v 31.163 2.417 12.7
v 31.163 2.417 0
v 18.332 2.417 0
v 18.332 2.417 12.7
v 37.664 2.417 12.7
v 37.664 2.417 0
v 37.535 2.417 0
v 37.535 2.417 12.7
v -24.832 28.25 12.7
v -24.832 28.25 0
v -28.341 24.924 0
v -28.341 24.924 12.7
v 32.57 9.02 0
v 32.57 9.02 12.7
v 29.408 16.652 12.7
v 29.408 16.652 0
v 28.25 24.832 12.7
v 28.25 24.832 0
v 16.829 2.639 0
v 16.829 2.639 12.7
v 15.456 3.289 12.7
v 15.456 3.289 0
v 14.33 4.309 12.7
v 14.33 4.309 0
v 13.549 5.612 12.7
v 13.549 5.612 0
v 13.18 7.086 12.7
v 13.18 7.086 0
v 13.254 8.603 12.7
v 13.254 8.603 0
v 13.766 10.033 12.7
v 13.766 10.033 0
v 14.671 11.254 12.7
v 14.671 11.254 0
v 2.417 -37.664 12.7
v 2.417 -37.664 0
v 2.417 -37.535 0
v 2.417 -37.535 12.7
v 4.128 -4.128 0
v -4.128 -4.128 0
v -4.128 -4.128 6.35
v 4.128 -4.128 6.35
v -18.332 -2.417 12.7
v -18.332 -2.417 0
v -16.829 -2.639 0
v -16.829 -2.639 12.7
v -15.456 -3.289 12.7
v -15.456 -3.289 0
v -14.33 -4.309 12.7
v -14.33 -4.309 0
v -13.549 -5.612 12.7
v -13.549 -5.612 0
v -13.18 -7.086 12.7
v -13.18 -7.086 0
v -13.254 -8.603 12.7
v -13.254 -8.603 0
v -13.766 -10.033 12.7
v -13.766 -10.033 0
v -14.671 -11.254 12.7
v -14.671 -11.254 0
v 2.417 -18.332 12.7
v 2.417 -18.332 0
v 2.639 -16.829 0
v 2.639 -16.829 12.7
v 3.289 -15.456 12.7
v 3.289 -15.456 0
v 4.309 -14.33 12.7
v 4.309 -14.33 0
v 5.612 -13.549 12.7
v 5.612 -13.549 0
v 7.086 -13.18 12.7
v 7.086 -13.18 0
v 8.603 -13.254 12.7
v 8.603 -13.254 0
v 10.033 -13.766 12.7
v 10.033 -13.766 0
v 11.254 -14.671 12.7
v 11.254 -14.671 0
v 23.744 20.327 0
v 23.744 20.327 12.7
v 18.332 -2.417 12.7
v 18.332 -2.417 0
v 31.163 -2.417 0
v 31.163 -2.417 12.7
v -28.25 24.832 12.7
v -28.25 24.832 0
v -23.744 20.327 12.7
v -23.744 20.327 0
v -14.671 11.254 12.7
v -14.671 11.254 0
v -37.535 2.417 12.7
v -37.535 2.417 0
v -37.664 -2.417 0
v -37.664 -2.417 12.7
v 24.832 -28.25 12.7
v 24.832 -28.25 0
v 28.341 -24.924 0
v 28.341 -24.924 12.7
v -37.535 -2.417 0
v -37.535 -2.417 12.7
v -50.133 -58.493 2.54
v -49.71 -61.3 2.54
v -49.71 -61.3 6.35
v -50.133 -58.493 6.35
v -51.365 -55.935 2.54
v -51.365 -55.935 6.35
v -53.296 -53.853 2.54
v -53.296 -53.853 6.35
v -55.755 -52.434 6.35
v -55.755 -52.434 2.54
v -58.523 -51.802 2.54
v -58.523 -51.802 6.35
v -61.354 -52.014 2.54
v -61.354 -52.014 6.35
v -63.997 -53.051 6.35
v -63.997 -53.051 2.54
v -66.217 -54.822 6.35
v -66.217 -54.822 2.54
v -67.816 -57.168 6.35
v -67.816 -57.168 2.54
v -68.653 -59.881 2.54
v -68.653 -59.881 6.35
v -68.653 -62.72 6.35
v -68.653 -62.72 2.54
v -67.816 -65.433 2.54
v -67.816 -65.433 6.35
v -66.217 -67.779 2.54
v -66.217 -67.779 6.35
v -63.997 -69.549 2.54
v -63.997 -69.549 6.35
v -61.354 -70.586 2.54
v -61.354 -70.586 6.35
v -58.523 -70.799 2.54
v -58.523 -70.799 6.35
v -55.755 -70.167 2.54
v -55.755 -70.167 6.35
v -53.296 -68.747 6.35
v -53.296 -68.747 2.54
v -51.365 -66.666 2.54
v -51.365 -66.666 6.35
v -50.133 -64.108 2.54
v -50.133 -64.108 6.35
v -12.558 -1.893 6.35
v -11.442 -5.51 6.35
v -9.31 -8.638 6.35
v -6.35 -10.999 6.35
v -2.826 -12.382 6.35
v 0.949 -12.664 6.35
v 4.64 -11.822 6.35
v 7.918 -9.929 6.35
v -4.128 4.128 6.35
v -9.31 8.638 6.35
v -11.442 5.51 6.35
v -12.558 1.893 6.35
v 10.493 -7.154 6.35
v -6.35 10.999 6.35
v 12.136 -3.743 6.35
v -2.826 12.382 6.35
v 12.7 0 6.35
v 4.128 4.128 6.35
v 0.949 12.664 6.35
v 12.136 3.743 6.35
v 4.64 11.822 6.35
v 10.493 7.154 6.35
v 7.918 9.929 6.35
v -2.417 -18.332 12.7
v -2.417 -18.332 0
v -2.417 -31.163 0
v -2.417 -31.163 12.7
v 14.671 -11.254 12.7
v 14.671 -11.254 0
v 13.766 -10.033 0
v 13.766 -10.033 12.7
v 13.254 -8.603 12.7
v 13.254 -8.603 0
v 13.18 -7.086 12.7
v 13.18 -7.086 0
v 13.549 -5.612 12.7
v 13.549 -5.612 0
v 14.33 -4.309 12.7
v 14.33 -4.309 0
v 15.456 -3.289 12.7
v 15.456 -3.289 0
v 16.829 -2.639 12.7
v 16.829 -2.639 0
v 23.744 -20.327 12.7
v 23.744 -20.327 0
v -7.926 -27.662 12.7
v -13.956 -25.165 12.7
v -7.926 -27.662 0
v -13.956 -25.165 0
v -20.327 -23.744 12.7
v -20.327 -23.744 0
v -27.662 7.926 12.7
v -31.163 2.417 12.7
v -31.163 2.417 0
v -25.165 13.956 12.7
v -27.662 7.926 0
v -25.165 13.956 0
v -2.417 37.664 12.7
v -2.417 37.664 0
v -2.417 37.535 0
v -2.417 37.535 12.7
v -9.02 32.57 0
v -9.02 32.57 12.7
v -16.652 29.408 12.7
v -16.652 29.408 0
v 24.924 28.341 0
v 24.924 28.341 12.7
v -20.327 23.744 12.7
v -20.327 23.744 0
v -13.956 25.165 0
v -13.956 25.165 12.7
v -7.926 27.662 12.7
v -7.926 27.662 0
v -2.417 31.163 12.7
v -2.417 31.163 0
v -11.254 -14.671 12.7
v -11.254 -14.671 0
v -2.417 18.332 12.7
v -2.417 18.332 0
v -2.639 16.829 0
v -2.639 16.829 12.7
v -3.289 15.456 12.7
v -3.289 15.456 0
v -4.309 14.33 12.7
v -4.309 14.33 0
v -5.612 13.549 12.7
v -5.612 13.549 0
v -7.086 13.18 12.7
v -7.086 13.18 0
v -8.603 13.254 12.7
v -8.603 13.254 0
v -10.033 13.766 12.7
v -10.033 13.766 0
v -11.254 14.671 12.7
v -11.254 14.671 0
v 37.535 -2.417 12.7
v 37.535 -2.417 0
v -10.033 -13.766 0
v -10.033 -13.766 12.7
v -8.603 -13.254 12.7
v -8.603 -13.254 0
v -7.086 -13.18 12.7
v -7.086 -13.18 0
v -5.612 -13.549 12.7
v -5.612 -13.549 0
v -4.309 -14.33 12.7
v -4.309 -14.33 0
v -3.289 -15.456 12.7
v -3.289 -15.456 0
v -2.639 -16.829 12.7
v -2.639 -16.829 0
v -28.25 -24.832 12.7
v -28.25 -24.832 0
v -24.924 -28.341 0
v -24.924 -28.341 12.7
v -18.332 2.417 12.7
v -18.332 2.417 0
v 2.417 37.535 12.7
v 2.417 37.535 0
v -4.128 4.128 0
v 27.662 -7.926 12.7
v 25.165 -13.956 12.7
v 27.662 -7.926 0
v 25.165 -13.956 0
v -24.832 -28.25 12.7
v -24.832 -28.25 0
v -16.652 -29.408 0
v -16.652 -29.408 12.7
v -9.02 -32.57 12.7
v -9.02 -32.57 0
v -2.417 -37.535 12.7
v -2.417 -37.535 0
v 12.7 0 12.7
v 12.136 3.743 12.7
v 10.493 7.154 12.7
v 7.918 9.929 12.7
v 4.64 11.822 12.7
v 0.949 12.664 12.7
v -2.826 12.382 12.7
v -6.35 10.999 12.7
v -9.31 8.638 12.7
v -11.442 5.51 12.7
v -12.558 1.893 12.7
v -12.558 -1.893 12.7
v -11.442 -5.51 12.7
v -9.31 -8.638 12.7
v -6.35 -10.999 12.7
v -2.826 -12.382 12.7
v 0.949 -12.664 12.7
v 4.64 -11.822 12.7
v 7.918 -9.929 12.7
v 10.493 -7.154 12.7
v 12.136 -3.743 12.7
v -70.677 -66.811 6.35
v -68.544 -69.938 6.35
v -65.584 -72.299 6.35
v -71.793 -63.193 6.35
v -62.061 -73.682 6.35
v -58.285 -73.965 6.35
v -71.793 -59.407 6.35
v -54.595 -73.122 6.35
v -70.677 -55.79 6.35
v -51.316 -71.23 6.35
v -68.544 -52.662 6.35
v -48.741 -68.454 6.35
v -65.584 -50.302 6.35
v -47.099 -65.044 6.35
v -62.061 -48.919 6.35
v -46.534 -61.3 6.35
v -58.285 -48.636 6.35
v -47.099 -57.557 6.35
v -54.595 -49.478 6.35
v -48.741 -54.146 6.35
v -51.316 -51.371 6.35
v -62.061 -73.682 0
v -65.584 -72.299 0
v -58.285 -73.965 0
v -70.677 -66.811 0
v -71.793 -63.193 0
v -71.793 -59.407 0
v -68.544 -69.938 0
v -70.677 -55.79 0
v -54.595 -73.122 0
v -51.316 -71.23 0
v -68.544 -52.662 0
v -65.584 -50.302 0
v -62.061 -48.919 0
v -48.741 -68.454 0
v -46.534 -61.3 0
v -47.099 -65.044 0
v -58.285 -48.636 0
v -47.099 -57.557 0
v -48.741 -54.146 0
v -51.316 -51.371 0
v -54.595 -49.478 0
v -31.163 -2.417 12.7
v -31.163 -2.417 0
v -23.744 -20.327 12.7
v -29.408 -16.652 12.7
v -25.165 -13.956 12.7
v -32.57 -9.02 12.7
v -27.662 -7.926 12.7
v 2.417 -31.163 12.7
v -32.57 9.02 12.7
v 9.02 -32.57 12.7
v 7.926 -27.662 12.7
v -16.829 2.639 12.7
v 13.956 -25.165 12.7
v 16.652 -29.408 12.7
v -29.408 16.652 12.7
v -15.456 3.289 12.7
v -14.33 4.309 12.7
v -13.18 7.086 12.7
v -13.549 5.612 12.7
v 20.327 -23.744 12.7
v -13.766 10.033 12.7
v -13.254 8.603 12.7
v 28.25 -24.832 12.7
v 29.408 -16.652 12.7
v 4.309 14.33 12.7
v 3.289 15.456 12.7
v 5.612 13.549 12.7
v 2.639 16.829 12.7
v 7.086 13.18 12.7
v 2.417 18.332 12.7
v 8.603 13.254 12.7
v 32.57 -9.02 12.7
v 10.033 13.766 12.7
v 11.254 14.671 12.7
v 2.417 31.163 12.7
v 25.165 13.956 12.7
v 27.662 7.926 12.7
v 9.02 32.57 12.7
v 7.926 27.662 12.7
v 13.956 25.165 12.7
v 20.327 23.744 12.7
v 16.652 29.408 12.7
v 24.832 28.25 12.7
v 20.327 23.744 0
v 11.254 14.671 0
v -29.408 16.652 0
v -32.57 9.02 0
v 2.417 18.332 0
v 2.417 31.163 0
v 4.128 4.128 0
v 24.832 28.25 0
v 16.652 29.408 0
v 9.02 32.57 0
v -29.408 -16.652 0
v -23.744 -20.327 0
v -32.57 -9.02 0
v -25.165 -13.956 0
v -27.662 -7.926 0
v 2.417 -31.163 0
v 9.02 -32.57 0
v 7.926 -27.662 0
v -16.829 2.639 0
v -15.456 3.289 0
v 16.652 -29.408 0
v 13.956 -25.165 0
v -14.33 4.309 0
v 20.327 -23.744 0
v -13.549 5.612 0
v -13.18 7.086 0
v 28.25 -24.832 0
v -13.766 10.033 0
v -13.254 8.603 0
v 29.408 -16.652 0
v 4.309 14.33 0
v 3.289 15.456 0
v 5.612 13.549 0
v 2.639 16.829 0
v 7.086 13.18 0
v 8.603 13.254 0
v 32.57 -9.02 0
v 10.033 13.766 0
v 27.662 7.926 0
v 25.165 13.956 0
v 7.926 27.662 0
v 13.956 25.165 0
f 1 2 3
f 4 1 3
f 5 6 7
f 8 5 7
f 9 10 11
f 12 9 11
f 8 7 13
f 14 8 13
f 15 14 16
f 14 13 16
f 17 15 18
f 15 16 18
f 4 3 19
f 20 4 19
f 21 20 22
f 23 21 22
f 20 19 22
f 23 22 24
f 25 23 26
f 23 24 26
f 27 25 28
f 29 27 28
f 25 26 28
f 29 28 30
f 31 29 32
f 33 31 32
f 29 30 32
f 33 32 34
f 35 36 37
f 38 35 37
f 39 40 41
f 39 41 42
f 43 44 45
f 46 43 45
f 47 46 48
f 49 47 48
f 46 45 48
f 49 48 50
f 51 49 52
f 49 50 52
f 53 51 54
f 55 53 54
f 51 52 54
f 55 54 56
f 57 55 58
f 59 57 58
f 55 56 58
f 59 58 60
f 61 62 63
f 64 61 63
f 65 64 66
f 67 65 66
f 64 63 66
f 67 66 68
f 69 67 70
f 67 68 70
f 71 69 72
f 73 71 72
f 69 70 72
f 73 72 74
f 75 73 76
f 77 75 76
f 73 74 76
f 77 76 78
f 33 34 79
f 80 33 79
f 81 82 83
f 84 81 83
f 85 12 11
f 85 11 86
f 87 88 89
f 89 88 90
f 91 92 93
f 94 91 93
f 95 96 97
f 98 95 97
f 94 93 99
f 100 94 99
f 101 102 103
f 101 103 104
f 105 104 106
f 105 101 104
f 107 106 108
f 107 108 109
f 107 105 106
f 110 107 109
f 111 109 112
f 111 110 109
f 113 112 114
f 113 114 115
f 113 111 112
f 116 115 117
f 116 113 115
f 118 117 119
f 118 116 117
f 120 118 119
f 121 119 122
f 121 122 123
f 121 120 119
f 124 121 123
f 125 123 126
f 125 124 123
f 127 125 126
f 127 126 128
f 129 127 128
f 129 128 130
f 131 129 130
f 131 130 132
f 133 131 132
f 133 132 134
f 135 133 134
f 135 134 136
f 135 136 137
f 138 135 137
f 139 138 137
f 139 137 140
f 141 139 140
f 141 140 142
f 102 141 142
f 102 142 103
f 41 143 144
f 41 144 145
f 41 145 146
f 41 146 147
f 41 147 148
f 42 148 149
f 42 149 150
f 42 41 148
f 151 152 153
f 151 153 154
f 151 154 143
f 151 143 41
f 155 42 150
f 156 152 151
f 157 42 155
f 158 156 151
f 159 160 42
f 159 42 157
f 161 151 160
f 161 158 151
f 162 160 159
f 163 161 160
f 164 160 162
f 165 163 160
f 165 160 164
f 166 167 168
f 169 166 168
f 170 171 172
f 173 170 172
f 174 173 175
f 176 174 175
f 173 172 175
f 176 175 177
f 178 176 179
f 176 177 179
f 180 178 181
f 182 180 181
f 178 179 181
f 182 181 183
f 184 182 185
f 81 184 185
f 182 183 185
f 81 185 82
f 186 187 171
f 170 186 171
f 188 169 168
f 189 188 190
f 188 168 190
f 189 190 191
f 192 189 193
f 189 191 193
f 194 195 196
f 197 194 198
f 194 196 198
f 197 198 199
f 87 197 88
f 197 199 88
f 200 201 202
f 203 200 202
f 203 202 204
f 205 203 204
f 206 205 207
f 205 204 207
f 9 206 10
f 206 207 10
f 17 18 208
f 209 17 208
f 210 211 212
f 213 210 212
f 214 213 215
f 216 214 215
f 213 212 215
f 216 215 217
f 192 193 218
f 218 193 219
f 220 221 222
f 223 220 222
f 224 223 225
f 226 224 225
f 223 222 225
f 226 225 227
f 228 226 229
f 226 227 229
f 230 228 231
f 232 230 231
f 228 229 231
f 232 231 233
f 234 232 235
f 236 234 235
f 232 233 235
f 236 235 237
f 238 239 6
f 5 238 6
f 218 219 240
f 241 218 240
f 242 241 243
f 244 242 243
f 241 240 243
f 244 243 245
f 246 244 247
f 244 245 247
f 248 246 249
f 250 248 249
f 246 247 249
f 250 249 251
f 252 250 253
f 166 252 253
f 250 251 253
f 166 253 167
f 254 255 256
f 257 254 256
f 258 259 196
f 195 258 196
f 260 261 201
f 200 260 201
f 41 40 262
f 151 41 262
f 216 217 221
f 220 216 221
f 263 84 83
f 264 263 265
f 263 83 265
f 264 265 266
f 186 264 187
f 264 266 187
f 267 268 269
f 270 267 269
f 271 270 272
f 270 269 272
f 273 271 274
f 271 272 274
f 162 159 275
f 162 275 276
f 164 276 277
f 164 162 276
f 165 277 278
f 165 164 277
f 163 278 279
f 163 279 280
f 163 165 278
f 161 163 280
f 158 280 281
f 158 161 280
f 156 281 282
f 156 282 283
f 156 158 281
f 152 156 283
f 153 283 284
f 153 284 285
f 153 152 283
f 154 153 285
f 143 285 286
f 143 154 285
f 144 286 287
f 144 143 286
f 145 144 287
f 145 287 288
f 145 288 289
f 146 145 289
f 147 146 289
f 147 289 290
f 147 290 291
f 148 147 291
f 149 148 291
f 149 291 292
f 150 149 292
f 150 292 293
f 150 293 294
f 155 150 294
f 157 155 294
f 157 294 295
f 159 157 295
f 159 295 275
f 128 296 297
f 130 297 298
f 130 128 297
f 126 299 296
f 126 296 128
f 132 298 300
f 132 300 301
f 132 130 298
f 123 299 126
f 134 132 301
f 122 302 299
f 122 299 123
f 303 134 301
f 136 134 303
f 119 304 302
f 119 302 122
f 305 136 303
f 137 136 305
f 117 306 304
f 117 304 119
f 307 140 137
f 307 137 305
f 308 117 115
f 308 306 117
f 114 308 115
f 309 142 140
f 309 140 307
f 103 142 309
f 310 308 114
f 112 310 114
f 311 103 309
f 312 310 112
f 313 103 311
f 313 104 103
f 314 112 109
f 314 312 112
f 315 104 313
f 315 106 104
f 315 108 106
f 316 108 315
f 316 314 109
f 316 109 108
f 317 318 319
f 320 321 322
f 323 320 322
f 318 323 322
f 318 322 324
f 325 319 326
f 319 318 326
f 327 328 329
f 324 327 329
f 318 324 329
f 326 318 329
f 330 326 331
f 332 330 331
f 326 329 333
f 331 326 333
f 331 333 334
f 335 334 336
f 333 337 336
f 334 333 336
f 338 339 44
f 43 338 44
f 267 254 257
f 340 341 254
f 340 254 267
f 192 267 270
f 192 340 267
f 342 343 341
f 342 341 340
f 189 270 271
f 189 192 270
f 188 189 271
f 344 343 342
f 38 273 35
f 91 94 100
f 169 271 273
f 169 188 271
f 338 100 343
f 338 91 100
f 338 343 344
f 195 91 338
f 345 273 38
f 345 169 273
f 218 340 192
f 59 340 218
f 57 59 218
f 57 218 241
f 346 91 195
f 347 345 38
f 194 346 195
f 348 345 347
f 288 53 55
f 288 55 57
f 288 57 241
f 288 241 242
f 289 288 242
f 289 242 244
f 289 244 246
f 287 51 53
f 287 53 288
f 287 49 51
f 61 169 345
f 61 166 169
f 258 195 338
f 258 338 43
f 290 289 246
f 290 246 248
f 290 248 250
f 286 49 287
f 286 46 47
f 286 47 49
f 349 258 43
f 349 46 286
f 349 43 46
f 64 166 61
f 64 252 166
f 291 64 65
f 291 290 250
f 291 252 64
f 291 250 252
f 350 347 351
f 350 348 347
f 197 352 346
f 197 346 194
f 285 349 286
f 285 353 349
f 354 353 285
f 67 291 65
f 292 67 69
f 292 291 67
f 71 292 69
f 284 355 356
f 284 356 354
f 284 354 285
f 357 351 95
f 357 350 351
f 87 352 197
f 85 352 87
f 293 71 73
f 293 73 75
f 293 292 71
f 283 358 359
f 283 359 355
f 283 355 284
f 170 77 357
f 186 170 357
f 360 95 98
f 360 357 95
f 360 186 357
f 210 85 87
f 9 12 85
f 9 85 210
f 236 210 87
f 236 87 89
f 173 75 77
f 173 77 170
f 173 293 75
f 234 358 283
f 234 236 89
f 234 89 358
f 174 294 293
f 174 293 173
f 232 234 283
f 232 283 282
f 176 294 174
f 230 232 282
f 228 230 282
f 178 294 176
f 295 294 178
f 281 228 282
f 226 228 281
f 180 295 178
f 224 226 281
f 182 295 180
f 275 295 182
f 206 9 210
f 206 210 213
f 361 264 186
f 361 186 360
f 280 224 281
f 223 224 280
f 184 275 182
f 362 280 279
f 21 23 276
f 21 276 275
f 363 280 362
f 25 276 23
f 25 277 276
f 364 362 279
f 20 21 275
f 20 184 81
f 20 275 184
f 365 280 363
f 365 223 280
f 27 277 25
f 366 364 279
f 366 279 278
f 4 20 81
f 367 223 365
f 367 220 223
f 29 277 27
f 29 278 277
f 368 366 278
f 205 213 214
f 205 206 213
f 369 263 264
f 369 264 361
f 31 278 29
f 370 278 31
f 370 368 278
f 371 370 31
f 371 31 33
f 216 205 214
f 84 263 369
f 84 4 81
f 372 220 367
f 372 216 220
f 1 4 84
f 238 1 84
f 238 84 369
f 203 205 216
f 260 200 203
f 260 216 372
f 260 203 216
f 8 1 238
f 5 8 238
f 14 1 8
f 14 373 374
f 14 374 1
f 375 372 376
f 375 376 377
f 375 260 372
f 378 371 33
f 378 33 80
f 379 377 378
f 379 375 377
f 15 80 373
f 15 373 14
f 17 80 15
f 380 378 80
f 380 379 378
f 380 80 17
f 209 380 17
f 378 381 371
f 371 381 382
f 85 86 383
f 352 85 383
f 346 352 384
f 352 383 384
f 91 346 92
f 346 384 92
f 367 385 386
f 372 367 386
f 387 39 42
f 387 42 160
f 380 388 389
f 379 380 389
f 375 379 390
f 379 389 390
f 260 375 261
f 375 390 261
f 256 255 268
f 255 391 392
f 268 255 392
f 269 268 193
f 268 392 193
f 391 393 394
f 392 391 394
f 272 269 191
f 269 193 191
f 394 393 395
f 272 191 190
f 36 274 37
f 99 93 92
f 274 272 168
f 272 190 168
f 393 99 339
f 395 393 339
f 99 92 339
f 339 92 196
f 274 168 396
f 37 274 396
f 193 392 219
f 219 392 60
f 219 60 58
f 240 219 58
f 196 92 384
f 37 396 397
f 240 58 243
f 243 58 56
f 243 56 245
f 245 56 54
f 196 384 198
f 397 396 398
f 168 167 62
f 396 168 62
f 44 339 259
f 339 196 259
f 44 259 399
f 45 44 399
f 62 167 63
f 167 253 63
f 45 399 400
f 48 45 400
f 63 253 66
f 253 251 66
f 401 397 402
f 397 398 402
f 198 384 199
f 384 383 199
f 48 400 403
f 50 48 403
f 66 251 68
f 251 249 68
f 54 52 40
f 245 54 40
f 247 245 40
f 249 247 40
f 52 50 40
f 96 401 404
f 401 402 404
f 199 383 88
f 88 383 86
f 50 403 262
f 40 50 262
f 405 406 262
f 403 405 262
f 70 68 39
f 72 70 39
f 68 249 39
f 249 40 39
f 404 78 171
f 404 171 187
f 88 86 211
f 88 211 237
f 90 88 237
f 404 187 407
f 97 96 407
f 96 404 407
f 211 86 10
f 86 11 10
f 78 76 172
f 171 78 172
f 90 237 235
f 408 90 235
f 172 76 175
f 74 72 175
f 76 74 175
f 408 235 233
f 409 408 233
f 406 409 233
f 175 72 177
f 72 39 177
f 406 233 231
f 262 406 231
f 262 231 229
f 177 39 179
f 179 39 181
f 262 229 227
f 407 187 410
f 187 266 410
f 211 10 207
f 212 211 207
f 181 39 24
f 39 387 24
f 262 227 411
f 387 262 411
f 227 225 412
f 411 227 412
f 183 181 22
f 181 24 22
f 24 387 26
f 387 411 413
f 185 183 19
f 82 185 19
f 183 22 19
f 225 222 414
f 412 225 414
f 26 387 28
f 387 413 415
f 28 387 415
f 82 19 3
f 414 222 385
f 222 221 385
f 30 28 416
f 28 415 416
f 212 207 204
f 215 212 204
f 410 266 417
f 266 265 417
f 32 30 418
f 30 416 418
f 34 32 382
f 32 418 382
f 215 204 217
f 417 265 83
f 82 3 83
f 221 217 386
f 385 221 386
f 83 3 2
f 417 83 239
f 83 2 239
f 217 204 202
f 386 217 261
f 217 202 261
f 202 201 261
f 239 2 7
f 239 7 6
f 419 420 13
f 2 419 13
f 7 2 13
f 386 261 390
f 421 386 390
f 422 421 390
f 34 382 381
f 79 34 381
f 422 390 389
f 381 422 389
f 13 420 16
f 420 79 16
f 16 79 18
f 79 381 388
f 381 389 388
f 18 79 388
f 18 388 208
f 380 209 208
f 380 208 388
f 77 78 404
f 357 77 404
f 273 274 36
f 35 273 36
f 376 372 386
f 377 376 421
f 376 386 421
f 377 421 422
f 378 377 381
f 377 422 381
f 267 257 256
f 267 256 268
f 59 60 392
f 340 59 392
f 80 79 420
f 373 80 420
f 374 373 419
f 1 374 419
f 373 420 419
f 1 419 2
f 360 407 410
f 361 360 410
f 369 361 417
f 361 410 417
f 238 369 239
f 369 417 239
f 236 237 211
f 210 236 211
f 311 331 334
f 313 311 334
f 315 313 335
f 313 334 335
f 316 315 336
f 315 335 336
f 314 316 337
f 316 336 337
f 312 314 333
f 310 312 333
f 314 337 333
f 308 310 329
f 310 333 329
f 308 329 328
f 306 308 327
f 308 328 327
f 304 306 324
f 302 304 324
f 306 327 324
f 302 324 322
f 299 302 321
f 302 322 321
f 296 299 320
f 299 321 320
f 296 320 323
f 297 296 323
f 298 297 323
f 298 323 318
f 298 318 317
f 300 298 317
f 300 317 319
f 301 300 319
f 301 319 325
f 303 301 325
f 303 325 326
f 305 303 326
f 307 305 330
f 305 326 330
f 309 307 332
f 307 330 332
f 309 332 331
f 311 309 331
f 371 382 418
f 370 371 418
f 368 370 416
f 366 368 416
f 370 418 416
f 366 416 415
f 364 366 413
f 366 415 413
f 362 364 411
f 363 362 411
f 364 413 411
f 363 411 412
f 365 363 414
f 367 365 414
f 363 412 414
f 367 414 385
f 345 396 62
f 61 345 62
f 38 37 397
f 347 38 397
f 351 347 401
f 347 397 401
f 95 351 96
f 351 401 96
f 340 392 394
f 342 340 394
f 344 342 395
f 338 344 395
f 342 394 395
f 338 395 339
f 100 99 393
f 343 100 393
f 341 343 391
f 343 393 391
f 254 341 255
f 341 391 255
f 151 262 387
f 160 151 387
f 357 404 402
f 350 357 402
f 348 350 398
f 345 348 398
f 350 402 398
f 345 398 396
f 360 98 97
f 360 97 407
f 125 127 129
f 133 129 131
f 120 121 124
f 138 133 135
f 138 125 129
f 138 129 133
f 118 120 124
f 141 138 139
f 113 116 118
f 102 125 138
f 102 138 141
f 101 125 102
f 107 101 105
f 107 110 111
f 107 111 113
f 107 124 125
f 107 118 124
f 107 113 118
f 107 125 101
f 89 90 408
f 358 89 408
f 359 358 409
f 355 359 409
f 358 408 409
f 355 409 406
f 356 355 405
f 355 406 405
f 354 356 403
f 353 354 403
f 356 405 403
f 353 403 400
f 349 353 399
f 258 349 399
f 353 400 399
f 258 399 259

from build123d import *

# Parameters (mm, degrees)
F0_R     = 12.7
F0_W     = 8.255
F0_H     = 8.255
F1_DEPTH = 6.35
F2_DEPTH = 12.7
F3_R     = 12.7
F3_R_2   = 9.525
F4_DEPTH = 6.35
F5_DEPTH = 2.54


with BuildPart() as f1:
    # F0 (on Top) → F1 (new body)
    with BuildSketch(Plane.XY):
        Circle(F0_R)
        Rectangle(F0_W, F0_H, mode=Mode.SUBTRACT)
    extrude(amount=F1_DEPTH)

    # F0 (on Top) → F2 (join)
    with BuildSketch(Plane.XY):
        with BuildLine():
            ThreePointArc((-37.53473, -2.416579), (-30.748057, -12.736262), (-28.249842, -24.832283))
            Line((-28.249842, -24.832283), (-23.744405, -20.326846))
            ThreePointArc((-23.744405, -20.326846), (-26.2828, -10.886692), (-31.163081, -2.416579))
            Line((-31.163081, -2.416579), (-37.53473, -2.416579))
        make_face()
        with BuildLine():
            ThreePointArc((-24.832283, -28.249842), (-12.736262, -30.748057), (-2.416579, -37.53473))
            Line((-2.416579, -37.53473), (-2.416579, -31.163081))
            ThreePointArc((-2.416579, -31.163081), (-10.886692, -26.2828), (-20.326846, -23.744405))
            Line((-20.326846, -23.744405), (-24.832283, -28.249842))
        make_face()
        with BuildLine():
            ThreePointArc((2.416579, -37.53473), (12.736262, -30.748057), (24.832283, -28.249842))
            Line((24.832283, -28.249842), (20.326846, -23.744405))
            ThreePointArc((20.326846, -23.744405), (10.886692, -26.2828), (2.416579, -31.163081))
            Line((2.416579, -31.163081), (2.416579, -37.53473))
        make_face()
        with BuildLine():
            Line((37.53473, -2.416579), (31.163081, -2.416579))
            ThreePointArc((31.163081, -2.416579), (26.2828, -10.886692), (23.744405, -20.326846))
            Line((23.744405, -20.326846), (28.249842, -24.832283))
            ThreePointArc((28.249842, -24.832283), (30.748057, -12.736262), (37.53473, -2.416579))
        make_face()
        with BuildLine():
            Line((31.163081, 2.416579), (37.53473, 2.416579))
            ThreePointArc((37.53473, 2.416579), (30.748057, 12.736262), (28.249842, 24.832283))
            Line((28.249842, 24.832283), (23.744405, 20.326846))
            ThreePointArc((23.744405, 20.326846), (26.2828, 10.886692), (31.163081, 2.416579))
        make_face()
        with BuildLine():
            ThreePointArc((14.671217, -11.253658), (13.549063, -5.612205), (18.331655, -2.416579))
            Line((18.331655, -2.416579), (31.163081, -2.416579))
            Line((31.163081, -2.416579), (37.53473, -2.416579))
            Line((37.53473, -2.416579), (37.66429, 2.416579))
            Line((37.66429, 2.416579), (37.53473, 2.416579))
            Line((37.53473, 2.416579), (31.163081, 2.416579))
            Line((31.163081, 2.416579), (18.331655, 2.416579))
            ThreePointArc((18.331655, 2.416579), (13.549063, 5.612205), (14.671217, 11.253658))
            Line((14.671217, 11.253658), (23.744405, 20.326846))
            Line((23.744405, 20.326846), (28.249842, 24.832283))
            Line((28.249842, 24.832283), (24.923895, 28.341454))
            Line((24.923895, 28.341454), (24.832283, 28.249842))
            Line((24.832283, 28.249842), (20.326846, 23.744405))
            Line((20.326846, 23.744405), (11.253658, 14.671217))
            ThreePointArc((11.253658, 14.671217), (5.612205, 13.549063), (2.416579, 18.331655))
            Line((2.416579, 18.331655), (2.416579, 31.163081))
            Line((2.416579, 31.163081), (2.416579, 37.53473))
            Line((2.416579, 37.53473), (-2.416579, 37.66429))
            Line((-2.416579, 37.66429), (-2.416579, 37.53473))
            Line((-2.416579, 37.53473), (-2.416579, 31.163081))
            Line((-2.416579, 31.163081), (-2.416579, 18.331655))
            ThreePointArc((-2.416579, 18.331655), (-5.612205, 13.549063), (-11.253658, 14.671217))
            Line((-11.253658, 14.671217), (-20.326846, 23.744405))
            Line((-20.326846, 23.744405), (-24.832283, 28.249842))
            Line((-24.832283, 28.249842), (-28.341454, 24.923895))
            Line((-28.341454, 24.923895), (-28.249842, 24.832283))
            Line((-28.249842, 24.832283), (-23.744405, 20.326846))
            Line((-23.744405, 20.326846), (-14.671217, 11.253658))
            ThreePointArc((-14.671217, 11.253658), (-13.549063, 5.612205), (-18.331655, 2.416579))
            Line((-18.331655, 2.416579), (-31.163081, 2.416579))
            Line((-31.163081, 2.416579), (-37.53473, 2.416579))
            Line((-37.53473, 2.416579), (-37.66429, -2.416579))
            Line((-37.66429, -2.416579), (-37.53473, -2.416579))
            Line((-37.53473, -2.416579), (-31.163081, -2.416579))
            Line((-31.163081, -2.416579), (-18.331655, -2.416579))
            ThreePointArc((-18.331655, -2.416579), (-13.549063, -5.612205), (-14.671217, -11.253658))
            Line((-14.671217, -11.253658), (-23.744405, -20.326846))
            Line((-23.744405, -20.326846), (-28.249842, -24.832283))
            Line((-28.249842, -24.832283), (-24.923895, -28.341454))
            Line((-24.923895, -28.341454), (-24.832283, -28.249842))
            Line((-24.832283, -28.249842), (-20.326846, -23.744405))
            Line((-20.326846, -23.744405), (-11.253658, -14.671217))
            ThreePointArc((-11.253658, -14.671217), (-5.612205, -13.549063), (-2.416579, -18.331655))
            Line((-2.416579, -18.331655), (-2.416579, -31.163081))
            Line((-2.416579, -31.163081), (-2.416579, -37.53473))
            Line((-2.416579, -37.53473), (2.416579, -37.66429))
            Line((2.416579, -37.66429), (2.416579, -37.53473))
            Line((2.416579, -37.53473), (2.416579, -31.163081))
            Line((2.416579, -31.163081), (2.416579, -18.331655))
            ThreePointArc((2.416579, -18.331655), (5.612205, -13.549063), (11.253658, -14.671217))
            Line((11.253658, -14.671217), (20.326846, -23.744405))
            Line((20.326846, -23.744405), (24.832283, -28.249842))
            Line((24.832283, -28.249842), (28.341454, -24.923895))
            Line((28.341454, -24.923895), (28.249842, -24.832283))
            Line((28.249842, -24.832283), (23.744405, -20.326846))
            Line((23.744405, -20.326846), (14.671217, -11.253658))
        make_face()
        Circle(F0_R, mode=Mode.SUBTRACT)
        with BuildLine():
            Line((-23.744405, 20.326846), (-28.249842, 24.832283))
            ThreePointArc((-28.249842, 24.832283), (-30.748057, 12.736262), (-37.53473, 2.416579))
            Line((-37.53473, 2.416579), (-31.163081, 2.416579))
            ThreePointArc((-31.163081, 2.416579), (-26.2828, 10.886692), (-23.744405, 20.326846))
        make_face()
        with BuildLine():
            Line((-2.416579, 31.163081), (-2.416579, 37.53473))
            ThreePointArc((-2.416579, 37.53473), (-12.736262, 30.748057), (-24.832283, 28.249842))
            Line((-24.832283, 28.249842), (-20.326846, 23.744405))
            ThreePointArc((-20.326846, 23.744405), (-10.886692, 26.2828), (-2.416579, 31.163081))
        make_face()
        with BuildLine():
            Line((20.326846, 23.744405), (24.832283, 28.249842))
            ThreePointArc((24.832283, 28.249842), (12.736262, 30.748057), (2.416579, 37.53473))
            Line((2.416579, 37.53473), (2.416579, 31.163081))
            ThreePointArc((2.416579, 31.163081), (10.886692, 26.2828), (20.326846, 23.744405))
        make_face()
    extrude(amount=F2_DEPTH)


with BuildPart() as f4:
    # F3 (on Top) → F4 (new body)
    with BuildSketch(Plane.XY):
        with Locations((-59.2345, -61.300252)):
            Circle(F3_R)
        with Locations((-59.2345, -61.300252)):
            Circle(F3_R_2, mode=Mode.SUBTRACT)
    extrude(amount=F4_DEPTH)

    # F3 (on Top) → F5 (join)
    with BuildSketch(Plane.XY):
        with Locations((-59.2345, -61.300252)):
            Circle(F3_R_2)
    extrude(amount=F5_DEPTH)


solid = Compound([f1.part, f4.part])
